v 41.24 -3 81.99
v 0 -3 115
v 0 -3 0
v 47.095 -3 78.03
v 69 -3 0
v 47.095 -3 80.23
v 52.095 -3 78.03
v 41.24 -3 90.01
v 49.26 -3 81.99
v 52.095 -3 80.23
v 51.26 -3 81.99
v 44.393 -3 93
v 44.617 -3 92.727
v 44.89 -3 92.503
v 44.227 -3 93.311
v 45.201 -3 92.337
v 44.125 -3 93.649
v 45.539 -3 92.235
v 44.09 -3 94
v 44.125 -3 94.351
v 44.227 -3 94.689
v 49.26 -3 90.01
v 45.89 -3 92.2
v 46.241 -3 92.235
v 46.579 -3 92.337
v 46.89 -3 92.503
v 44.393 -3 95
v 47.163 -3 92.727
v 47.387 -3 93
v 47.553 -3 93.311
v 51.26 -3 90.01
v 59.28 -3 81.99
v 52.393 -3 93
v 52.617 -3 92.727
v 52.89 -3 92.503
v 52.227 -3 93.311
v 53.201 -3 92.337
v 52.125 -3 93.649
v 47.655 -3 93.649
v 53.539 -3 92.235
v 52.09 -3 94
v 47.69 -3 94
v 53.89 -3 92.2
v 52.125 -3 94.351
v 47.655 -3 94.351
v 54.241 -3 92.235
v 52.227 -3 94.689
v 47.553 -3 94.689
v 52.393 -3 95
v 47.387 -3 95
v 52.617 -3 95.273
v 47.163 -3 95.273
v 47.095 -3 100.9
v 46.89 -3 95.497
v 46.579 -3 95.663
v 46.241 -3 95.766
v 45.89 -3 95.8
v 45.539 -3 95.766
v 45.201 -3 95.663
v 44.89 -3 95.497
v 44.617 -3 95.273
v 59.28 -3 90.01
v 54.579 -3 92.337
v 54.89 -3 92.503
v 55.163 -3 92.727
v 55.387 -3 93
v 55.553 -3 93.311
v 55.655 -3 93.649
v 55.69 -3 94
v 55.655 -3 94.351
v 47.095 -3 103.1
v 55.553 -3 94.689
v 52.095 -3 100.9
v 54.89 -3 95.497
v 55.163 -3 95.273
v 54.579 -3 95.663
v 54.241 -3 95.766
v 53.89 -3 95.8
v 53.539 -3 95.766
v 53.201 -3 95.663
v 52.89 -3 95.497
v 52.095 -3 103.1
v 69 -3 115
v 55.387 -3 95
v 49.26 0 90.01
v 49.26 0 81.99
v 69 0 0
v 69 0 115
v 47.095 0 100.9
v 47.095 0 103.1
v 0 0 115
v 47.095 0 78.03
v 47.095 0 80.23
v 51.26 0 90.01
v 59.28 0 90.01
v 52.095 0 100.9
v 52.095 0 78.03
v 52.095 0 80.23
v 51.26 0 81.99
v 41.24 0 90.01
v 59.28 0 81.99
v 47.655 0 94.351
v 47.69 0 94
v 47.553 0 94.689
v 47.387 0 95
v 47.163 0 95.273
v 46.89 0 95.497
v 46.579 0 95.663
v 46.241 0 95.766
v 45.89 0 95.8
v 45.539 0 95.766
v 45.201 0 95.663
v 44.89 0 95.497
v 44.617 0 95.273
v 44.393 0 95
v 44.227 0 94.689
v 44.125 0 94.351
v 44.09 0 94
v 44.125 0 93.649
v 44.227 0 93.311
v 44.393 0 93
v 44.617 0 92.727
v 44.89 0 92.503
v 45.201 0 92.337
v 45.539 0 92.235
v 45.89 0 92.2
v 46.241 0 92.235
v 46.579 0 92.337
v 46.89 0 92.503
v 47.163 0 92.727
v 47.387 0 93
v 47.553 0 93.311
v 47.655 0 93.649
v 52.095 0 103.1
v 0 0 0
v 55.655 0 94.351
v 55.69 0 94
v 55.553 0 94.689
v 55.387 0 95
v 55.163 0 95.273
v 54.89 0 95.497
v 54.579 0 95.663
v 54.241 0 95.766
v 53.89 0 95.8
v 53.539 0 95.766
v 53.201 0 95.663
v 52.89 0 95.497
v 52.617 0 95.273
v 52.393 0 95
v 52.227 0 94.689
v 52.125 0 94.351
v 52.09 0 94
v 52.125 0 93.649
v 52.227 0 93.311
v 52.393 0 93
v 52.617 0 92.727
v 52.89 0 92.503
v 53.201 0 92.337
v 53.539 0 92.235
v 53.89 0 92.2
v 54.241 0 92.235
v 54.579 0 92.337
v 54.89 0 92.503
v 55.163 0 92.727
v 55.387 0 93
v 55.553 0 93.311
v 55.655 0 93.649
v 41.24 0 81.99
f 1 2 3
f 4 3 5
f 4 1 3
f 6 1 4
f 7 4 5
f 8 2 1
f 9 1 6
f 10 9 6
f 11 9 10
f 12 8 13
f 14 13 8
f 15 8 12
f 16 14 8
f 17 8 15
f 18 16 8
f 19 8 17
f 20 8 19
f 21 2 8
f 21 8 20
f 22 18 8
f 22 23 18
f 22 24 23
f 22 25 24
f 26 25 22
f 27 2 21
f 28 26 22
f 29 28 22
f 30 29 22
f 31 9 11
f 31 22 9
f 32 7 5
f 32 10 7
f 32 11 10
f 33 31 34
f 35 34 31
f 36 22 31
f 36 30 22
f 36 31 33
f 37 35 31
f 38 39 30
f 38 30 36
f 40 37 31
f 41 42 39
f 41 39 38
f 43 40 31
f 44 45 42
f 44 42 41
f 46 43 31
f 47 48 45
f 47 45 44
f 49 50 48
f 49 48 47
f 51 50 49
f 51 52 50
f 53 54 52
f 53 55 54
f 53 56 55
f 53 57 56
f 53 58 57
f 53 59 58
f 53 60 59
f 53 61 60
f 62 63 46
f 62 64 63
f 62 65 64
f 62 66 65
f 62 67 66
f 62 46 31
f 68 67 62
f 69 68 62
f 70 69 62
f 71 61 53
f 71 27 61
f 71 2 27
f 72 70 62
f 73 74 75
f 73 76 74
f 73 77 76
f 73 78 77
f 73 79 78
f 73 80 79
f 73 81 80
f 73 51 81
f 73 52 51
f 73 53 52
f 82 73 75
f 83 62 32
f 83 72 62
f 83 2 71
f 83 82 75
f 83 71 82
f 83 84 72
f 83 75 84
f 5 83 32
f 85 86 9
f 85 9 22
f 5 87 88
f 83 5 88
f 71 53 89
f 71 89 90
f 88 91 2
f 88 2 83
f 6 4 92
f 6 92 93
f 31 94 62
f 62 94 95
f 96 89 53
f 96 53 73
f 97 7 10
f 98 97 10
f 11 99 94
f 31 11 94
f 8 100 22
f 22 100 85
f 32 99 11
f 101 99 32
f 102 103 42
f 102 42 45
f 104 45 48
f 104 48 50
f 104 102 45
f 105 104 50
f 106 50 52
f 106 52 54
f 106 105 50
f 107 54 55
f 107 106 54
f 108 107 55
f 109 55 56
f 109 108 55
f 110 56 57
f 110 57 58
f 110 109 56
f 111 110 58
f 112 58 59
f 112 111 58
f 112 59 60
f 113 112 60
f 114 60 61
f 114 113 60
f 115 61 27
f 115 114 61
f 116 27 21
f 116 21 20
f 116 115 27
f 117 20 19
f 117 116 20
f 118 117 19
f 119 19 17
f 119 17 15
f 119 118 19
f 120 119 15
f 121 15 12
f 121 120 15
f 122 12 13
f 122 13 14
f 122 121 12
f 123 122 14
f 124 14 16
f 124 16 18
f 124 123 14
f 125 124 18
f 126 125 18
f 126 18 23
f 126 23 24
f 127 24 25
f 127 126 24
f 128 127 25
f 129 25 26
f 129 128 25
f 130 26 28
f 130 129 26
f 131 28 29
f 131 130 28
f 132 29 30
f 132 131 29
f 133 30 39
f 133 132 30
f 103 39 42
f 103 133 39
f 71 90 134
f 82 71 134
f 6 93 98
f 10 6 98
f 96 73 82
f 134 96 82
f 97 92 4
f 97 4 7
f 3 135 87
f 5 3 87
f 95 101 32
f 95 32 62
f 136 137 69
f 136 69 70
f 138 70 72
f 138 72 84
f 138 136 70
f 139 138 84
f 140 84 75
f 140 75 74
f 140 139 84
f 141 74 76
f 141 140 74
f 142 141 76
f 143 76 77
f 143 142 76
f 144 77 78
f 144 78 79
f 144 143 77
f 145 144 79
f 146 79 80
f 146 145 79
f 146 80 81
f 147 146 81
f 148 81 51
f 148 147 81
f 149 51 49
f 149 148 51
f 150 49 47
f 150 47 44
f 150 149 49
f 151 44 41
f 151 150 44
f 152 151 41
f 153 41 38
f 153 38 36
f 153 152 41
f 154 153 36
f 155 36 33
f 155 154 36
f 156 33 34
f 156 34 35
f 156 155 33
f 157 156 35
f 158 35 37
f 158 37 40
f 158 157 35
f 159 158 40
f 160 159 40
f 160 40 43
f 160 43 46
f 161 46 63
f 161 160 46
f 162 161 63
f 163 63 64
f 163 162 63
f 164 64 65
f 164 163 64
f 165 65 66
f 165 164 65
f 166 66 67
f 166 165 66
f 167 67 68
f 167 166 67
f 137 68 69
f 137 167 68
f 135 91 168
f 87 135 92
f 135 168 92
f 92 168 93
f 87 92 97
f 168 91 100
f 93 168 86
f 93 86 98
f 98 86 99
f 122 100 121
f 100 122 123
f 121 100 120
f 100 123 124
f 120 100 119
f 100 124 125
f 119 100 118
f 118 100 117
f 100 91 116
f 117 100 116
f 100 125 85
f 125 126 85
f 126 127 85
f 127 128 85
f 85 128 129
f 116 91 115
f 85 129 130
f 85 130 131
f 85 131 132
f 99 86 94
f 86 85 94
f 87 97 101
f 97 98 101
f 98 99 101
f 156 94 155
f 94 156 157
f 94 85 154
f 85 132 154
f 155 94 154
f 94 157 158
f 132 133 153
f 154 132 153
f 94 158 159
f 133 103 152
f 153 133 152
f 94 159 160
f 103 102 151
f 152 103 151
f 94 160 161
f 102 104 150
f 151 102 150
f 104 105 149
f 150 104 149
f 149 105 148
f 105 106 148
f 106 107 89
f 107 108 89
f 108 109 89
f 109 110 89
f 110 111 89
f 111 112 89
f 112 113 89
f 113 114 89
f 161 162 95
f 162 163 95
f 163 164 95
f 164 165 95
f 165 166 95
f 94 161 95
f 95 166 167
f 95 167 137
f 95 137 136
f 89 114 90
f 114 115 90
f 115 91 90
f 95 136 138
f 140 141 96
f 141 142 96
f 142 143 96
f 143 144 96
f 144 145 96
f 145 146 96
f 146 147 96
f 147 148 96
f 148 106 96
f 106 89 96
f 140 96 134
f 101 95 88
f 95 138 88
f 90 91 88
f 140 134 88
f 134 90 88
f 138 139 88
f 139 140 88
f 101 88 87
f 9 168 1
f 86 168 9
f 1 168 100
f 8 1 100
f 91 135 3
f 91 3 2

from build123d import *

# Parameters (mm, degrees)
F0_W     = 69
F0_H     = 115
F0_W_2   = 8.02
F0_H_2   = 8.02
F0_W_3   = 5
F0_H_3   = 2.2
F0_R     = 1.8
F1_DEPTH = 3


with BuildPart() as f1:
    # F0 (on Front) → F1 (new body)
    with BuildSketch(Plane.XZ):
        with Locations((34.5, 57.5)):
            Rectangle(F0_W, F0_H)
        with Locations((45.25, 86)):
            Rectangle(F0_W_2, F0_H_2, mode=Mode.SUBTRACT)
        with Locations((49.595, 79.13)):
            Rectangle(F0_W_3, F0_H_3, mode=Mode.SUBTRACT)
        with Locations((55.27, 86)):
            Rectangle(F0_W_2, F0_H_2, mode=Mode.SUBTRACT)
        with Locations((45.89, 94.0001)):
            Circle(F0_R, mode=Mode.SUBTRACT)
        with Locations((49.595, 102)):
            Rectangle(F0_W_3, F0_H_3, mode=Mode.SUBTRACT)
        with Locations((53.89, 94.0001)):
            Circle(F0_R, mode=Mode.SUBTRACT)
    extrude(amount=F1_DEPTH)


solid = f1.part
